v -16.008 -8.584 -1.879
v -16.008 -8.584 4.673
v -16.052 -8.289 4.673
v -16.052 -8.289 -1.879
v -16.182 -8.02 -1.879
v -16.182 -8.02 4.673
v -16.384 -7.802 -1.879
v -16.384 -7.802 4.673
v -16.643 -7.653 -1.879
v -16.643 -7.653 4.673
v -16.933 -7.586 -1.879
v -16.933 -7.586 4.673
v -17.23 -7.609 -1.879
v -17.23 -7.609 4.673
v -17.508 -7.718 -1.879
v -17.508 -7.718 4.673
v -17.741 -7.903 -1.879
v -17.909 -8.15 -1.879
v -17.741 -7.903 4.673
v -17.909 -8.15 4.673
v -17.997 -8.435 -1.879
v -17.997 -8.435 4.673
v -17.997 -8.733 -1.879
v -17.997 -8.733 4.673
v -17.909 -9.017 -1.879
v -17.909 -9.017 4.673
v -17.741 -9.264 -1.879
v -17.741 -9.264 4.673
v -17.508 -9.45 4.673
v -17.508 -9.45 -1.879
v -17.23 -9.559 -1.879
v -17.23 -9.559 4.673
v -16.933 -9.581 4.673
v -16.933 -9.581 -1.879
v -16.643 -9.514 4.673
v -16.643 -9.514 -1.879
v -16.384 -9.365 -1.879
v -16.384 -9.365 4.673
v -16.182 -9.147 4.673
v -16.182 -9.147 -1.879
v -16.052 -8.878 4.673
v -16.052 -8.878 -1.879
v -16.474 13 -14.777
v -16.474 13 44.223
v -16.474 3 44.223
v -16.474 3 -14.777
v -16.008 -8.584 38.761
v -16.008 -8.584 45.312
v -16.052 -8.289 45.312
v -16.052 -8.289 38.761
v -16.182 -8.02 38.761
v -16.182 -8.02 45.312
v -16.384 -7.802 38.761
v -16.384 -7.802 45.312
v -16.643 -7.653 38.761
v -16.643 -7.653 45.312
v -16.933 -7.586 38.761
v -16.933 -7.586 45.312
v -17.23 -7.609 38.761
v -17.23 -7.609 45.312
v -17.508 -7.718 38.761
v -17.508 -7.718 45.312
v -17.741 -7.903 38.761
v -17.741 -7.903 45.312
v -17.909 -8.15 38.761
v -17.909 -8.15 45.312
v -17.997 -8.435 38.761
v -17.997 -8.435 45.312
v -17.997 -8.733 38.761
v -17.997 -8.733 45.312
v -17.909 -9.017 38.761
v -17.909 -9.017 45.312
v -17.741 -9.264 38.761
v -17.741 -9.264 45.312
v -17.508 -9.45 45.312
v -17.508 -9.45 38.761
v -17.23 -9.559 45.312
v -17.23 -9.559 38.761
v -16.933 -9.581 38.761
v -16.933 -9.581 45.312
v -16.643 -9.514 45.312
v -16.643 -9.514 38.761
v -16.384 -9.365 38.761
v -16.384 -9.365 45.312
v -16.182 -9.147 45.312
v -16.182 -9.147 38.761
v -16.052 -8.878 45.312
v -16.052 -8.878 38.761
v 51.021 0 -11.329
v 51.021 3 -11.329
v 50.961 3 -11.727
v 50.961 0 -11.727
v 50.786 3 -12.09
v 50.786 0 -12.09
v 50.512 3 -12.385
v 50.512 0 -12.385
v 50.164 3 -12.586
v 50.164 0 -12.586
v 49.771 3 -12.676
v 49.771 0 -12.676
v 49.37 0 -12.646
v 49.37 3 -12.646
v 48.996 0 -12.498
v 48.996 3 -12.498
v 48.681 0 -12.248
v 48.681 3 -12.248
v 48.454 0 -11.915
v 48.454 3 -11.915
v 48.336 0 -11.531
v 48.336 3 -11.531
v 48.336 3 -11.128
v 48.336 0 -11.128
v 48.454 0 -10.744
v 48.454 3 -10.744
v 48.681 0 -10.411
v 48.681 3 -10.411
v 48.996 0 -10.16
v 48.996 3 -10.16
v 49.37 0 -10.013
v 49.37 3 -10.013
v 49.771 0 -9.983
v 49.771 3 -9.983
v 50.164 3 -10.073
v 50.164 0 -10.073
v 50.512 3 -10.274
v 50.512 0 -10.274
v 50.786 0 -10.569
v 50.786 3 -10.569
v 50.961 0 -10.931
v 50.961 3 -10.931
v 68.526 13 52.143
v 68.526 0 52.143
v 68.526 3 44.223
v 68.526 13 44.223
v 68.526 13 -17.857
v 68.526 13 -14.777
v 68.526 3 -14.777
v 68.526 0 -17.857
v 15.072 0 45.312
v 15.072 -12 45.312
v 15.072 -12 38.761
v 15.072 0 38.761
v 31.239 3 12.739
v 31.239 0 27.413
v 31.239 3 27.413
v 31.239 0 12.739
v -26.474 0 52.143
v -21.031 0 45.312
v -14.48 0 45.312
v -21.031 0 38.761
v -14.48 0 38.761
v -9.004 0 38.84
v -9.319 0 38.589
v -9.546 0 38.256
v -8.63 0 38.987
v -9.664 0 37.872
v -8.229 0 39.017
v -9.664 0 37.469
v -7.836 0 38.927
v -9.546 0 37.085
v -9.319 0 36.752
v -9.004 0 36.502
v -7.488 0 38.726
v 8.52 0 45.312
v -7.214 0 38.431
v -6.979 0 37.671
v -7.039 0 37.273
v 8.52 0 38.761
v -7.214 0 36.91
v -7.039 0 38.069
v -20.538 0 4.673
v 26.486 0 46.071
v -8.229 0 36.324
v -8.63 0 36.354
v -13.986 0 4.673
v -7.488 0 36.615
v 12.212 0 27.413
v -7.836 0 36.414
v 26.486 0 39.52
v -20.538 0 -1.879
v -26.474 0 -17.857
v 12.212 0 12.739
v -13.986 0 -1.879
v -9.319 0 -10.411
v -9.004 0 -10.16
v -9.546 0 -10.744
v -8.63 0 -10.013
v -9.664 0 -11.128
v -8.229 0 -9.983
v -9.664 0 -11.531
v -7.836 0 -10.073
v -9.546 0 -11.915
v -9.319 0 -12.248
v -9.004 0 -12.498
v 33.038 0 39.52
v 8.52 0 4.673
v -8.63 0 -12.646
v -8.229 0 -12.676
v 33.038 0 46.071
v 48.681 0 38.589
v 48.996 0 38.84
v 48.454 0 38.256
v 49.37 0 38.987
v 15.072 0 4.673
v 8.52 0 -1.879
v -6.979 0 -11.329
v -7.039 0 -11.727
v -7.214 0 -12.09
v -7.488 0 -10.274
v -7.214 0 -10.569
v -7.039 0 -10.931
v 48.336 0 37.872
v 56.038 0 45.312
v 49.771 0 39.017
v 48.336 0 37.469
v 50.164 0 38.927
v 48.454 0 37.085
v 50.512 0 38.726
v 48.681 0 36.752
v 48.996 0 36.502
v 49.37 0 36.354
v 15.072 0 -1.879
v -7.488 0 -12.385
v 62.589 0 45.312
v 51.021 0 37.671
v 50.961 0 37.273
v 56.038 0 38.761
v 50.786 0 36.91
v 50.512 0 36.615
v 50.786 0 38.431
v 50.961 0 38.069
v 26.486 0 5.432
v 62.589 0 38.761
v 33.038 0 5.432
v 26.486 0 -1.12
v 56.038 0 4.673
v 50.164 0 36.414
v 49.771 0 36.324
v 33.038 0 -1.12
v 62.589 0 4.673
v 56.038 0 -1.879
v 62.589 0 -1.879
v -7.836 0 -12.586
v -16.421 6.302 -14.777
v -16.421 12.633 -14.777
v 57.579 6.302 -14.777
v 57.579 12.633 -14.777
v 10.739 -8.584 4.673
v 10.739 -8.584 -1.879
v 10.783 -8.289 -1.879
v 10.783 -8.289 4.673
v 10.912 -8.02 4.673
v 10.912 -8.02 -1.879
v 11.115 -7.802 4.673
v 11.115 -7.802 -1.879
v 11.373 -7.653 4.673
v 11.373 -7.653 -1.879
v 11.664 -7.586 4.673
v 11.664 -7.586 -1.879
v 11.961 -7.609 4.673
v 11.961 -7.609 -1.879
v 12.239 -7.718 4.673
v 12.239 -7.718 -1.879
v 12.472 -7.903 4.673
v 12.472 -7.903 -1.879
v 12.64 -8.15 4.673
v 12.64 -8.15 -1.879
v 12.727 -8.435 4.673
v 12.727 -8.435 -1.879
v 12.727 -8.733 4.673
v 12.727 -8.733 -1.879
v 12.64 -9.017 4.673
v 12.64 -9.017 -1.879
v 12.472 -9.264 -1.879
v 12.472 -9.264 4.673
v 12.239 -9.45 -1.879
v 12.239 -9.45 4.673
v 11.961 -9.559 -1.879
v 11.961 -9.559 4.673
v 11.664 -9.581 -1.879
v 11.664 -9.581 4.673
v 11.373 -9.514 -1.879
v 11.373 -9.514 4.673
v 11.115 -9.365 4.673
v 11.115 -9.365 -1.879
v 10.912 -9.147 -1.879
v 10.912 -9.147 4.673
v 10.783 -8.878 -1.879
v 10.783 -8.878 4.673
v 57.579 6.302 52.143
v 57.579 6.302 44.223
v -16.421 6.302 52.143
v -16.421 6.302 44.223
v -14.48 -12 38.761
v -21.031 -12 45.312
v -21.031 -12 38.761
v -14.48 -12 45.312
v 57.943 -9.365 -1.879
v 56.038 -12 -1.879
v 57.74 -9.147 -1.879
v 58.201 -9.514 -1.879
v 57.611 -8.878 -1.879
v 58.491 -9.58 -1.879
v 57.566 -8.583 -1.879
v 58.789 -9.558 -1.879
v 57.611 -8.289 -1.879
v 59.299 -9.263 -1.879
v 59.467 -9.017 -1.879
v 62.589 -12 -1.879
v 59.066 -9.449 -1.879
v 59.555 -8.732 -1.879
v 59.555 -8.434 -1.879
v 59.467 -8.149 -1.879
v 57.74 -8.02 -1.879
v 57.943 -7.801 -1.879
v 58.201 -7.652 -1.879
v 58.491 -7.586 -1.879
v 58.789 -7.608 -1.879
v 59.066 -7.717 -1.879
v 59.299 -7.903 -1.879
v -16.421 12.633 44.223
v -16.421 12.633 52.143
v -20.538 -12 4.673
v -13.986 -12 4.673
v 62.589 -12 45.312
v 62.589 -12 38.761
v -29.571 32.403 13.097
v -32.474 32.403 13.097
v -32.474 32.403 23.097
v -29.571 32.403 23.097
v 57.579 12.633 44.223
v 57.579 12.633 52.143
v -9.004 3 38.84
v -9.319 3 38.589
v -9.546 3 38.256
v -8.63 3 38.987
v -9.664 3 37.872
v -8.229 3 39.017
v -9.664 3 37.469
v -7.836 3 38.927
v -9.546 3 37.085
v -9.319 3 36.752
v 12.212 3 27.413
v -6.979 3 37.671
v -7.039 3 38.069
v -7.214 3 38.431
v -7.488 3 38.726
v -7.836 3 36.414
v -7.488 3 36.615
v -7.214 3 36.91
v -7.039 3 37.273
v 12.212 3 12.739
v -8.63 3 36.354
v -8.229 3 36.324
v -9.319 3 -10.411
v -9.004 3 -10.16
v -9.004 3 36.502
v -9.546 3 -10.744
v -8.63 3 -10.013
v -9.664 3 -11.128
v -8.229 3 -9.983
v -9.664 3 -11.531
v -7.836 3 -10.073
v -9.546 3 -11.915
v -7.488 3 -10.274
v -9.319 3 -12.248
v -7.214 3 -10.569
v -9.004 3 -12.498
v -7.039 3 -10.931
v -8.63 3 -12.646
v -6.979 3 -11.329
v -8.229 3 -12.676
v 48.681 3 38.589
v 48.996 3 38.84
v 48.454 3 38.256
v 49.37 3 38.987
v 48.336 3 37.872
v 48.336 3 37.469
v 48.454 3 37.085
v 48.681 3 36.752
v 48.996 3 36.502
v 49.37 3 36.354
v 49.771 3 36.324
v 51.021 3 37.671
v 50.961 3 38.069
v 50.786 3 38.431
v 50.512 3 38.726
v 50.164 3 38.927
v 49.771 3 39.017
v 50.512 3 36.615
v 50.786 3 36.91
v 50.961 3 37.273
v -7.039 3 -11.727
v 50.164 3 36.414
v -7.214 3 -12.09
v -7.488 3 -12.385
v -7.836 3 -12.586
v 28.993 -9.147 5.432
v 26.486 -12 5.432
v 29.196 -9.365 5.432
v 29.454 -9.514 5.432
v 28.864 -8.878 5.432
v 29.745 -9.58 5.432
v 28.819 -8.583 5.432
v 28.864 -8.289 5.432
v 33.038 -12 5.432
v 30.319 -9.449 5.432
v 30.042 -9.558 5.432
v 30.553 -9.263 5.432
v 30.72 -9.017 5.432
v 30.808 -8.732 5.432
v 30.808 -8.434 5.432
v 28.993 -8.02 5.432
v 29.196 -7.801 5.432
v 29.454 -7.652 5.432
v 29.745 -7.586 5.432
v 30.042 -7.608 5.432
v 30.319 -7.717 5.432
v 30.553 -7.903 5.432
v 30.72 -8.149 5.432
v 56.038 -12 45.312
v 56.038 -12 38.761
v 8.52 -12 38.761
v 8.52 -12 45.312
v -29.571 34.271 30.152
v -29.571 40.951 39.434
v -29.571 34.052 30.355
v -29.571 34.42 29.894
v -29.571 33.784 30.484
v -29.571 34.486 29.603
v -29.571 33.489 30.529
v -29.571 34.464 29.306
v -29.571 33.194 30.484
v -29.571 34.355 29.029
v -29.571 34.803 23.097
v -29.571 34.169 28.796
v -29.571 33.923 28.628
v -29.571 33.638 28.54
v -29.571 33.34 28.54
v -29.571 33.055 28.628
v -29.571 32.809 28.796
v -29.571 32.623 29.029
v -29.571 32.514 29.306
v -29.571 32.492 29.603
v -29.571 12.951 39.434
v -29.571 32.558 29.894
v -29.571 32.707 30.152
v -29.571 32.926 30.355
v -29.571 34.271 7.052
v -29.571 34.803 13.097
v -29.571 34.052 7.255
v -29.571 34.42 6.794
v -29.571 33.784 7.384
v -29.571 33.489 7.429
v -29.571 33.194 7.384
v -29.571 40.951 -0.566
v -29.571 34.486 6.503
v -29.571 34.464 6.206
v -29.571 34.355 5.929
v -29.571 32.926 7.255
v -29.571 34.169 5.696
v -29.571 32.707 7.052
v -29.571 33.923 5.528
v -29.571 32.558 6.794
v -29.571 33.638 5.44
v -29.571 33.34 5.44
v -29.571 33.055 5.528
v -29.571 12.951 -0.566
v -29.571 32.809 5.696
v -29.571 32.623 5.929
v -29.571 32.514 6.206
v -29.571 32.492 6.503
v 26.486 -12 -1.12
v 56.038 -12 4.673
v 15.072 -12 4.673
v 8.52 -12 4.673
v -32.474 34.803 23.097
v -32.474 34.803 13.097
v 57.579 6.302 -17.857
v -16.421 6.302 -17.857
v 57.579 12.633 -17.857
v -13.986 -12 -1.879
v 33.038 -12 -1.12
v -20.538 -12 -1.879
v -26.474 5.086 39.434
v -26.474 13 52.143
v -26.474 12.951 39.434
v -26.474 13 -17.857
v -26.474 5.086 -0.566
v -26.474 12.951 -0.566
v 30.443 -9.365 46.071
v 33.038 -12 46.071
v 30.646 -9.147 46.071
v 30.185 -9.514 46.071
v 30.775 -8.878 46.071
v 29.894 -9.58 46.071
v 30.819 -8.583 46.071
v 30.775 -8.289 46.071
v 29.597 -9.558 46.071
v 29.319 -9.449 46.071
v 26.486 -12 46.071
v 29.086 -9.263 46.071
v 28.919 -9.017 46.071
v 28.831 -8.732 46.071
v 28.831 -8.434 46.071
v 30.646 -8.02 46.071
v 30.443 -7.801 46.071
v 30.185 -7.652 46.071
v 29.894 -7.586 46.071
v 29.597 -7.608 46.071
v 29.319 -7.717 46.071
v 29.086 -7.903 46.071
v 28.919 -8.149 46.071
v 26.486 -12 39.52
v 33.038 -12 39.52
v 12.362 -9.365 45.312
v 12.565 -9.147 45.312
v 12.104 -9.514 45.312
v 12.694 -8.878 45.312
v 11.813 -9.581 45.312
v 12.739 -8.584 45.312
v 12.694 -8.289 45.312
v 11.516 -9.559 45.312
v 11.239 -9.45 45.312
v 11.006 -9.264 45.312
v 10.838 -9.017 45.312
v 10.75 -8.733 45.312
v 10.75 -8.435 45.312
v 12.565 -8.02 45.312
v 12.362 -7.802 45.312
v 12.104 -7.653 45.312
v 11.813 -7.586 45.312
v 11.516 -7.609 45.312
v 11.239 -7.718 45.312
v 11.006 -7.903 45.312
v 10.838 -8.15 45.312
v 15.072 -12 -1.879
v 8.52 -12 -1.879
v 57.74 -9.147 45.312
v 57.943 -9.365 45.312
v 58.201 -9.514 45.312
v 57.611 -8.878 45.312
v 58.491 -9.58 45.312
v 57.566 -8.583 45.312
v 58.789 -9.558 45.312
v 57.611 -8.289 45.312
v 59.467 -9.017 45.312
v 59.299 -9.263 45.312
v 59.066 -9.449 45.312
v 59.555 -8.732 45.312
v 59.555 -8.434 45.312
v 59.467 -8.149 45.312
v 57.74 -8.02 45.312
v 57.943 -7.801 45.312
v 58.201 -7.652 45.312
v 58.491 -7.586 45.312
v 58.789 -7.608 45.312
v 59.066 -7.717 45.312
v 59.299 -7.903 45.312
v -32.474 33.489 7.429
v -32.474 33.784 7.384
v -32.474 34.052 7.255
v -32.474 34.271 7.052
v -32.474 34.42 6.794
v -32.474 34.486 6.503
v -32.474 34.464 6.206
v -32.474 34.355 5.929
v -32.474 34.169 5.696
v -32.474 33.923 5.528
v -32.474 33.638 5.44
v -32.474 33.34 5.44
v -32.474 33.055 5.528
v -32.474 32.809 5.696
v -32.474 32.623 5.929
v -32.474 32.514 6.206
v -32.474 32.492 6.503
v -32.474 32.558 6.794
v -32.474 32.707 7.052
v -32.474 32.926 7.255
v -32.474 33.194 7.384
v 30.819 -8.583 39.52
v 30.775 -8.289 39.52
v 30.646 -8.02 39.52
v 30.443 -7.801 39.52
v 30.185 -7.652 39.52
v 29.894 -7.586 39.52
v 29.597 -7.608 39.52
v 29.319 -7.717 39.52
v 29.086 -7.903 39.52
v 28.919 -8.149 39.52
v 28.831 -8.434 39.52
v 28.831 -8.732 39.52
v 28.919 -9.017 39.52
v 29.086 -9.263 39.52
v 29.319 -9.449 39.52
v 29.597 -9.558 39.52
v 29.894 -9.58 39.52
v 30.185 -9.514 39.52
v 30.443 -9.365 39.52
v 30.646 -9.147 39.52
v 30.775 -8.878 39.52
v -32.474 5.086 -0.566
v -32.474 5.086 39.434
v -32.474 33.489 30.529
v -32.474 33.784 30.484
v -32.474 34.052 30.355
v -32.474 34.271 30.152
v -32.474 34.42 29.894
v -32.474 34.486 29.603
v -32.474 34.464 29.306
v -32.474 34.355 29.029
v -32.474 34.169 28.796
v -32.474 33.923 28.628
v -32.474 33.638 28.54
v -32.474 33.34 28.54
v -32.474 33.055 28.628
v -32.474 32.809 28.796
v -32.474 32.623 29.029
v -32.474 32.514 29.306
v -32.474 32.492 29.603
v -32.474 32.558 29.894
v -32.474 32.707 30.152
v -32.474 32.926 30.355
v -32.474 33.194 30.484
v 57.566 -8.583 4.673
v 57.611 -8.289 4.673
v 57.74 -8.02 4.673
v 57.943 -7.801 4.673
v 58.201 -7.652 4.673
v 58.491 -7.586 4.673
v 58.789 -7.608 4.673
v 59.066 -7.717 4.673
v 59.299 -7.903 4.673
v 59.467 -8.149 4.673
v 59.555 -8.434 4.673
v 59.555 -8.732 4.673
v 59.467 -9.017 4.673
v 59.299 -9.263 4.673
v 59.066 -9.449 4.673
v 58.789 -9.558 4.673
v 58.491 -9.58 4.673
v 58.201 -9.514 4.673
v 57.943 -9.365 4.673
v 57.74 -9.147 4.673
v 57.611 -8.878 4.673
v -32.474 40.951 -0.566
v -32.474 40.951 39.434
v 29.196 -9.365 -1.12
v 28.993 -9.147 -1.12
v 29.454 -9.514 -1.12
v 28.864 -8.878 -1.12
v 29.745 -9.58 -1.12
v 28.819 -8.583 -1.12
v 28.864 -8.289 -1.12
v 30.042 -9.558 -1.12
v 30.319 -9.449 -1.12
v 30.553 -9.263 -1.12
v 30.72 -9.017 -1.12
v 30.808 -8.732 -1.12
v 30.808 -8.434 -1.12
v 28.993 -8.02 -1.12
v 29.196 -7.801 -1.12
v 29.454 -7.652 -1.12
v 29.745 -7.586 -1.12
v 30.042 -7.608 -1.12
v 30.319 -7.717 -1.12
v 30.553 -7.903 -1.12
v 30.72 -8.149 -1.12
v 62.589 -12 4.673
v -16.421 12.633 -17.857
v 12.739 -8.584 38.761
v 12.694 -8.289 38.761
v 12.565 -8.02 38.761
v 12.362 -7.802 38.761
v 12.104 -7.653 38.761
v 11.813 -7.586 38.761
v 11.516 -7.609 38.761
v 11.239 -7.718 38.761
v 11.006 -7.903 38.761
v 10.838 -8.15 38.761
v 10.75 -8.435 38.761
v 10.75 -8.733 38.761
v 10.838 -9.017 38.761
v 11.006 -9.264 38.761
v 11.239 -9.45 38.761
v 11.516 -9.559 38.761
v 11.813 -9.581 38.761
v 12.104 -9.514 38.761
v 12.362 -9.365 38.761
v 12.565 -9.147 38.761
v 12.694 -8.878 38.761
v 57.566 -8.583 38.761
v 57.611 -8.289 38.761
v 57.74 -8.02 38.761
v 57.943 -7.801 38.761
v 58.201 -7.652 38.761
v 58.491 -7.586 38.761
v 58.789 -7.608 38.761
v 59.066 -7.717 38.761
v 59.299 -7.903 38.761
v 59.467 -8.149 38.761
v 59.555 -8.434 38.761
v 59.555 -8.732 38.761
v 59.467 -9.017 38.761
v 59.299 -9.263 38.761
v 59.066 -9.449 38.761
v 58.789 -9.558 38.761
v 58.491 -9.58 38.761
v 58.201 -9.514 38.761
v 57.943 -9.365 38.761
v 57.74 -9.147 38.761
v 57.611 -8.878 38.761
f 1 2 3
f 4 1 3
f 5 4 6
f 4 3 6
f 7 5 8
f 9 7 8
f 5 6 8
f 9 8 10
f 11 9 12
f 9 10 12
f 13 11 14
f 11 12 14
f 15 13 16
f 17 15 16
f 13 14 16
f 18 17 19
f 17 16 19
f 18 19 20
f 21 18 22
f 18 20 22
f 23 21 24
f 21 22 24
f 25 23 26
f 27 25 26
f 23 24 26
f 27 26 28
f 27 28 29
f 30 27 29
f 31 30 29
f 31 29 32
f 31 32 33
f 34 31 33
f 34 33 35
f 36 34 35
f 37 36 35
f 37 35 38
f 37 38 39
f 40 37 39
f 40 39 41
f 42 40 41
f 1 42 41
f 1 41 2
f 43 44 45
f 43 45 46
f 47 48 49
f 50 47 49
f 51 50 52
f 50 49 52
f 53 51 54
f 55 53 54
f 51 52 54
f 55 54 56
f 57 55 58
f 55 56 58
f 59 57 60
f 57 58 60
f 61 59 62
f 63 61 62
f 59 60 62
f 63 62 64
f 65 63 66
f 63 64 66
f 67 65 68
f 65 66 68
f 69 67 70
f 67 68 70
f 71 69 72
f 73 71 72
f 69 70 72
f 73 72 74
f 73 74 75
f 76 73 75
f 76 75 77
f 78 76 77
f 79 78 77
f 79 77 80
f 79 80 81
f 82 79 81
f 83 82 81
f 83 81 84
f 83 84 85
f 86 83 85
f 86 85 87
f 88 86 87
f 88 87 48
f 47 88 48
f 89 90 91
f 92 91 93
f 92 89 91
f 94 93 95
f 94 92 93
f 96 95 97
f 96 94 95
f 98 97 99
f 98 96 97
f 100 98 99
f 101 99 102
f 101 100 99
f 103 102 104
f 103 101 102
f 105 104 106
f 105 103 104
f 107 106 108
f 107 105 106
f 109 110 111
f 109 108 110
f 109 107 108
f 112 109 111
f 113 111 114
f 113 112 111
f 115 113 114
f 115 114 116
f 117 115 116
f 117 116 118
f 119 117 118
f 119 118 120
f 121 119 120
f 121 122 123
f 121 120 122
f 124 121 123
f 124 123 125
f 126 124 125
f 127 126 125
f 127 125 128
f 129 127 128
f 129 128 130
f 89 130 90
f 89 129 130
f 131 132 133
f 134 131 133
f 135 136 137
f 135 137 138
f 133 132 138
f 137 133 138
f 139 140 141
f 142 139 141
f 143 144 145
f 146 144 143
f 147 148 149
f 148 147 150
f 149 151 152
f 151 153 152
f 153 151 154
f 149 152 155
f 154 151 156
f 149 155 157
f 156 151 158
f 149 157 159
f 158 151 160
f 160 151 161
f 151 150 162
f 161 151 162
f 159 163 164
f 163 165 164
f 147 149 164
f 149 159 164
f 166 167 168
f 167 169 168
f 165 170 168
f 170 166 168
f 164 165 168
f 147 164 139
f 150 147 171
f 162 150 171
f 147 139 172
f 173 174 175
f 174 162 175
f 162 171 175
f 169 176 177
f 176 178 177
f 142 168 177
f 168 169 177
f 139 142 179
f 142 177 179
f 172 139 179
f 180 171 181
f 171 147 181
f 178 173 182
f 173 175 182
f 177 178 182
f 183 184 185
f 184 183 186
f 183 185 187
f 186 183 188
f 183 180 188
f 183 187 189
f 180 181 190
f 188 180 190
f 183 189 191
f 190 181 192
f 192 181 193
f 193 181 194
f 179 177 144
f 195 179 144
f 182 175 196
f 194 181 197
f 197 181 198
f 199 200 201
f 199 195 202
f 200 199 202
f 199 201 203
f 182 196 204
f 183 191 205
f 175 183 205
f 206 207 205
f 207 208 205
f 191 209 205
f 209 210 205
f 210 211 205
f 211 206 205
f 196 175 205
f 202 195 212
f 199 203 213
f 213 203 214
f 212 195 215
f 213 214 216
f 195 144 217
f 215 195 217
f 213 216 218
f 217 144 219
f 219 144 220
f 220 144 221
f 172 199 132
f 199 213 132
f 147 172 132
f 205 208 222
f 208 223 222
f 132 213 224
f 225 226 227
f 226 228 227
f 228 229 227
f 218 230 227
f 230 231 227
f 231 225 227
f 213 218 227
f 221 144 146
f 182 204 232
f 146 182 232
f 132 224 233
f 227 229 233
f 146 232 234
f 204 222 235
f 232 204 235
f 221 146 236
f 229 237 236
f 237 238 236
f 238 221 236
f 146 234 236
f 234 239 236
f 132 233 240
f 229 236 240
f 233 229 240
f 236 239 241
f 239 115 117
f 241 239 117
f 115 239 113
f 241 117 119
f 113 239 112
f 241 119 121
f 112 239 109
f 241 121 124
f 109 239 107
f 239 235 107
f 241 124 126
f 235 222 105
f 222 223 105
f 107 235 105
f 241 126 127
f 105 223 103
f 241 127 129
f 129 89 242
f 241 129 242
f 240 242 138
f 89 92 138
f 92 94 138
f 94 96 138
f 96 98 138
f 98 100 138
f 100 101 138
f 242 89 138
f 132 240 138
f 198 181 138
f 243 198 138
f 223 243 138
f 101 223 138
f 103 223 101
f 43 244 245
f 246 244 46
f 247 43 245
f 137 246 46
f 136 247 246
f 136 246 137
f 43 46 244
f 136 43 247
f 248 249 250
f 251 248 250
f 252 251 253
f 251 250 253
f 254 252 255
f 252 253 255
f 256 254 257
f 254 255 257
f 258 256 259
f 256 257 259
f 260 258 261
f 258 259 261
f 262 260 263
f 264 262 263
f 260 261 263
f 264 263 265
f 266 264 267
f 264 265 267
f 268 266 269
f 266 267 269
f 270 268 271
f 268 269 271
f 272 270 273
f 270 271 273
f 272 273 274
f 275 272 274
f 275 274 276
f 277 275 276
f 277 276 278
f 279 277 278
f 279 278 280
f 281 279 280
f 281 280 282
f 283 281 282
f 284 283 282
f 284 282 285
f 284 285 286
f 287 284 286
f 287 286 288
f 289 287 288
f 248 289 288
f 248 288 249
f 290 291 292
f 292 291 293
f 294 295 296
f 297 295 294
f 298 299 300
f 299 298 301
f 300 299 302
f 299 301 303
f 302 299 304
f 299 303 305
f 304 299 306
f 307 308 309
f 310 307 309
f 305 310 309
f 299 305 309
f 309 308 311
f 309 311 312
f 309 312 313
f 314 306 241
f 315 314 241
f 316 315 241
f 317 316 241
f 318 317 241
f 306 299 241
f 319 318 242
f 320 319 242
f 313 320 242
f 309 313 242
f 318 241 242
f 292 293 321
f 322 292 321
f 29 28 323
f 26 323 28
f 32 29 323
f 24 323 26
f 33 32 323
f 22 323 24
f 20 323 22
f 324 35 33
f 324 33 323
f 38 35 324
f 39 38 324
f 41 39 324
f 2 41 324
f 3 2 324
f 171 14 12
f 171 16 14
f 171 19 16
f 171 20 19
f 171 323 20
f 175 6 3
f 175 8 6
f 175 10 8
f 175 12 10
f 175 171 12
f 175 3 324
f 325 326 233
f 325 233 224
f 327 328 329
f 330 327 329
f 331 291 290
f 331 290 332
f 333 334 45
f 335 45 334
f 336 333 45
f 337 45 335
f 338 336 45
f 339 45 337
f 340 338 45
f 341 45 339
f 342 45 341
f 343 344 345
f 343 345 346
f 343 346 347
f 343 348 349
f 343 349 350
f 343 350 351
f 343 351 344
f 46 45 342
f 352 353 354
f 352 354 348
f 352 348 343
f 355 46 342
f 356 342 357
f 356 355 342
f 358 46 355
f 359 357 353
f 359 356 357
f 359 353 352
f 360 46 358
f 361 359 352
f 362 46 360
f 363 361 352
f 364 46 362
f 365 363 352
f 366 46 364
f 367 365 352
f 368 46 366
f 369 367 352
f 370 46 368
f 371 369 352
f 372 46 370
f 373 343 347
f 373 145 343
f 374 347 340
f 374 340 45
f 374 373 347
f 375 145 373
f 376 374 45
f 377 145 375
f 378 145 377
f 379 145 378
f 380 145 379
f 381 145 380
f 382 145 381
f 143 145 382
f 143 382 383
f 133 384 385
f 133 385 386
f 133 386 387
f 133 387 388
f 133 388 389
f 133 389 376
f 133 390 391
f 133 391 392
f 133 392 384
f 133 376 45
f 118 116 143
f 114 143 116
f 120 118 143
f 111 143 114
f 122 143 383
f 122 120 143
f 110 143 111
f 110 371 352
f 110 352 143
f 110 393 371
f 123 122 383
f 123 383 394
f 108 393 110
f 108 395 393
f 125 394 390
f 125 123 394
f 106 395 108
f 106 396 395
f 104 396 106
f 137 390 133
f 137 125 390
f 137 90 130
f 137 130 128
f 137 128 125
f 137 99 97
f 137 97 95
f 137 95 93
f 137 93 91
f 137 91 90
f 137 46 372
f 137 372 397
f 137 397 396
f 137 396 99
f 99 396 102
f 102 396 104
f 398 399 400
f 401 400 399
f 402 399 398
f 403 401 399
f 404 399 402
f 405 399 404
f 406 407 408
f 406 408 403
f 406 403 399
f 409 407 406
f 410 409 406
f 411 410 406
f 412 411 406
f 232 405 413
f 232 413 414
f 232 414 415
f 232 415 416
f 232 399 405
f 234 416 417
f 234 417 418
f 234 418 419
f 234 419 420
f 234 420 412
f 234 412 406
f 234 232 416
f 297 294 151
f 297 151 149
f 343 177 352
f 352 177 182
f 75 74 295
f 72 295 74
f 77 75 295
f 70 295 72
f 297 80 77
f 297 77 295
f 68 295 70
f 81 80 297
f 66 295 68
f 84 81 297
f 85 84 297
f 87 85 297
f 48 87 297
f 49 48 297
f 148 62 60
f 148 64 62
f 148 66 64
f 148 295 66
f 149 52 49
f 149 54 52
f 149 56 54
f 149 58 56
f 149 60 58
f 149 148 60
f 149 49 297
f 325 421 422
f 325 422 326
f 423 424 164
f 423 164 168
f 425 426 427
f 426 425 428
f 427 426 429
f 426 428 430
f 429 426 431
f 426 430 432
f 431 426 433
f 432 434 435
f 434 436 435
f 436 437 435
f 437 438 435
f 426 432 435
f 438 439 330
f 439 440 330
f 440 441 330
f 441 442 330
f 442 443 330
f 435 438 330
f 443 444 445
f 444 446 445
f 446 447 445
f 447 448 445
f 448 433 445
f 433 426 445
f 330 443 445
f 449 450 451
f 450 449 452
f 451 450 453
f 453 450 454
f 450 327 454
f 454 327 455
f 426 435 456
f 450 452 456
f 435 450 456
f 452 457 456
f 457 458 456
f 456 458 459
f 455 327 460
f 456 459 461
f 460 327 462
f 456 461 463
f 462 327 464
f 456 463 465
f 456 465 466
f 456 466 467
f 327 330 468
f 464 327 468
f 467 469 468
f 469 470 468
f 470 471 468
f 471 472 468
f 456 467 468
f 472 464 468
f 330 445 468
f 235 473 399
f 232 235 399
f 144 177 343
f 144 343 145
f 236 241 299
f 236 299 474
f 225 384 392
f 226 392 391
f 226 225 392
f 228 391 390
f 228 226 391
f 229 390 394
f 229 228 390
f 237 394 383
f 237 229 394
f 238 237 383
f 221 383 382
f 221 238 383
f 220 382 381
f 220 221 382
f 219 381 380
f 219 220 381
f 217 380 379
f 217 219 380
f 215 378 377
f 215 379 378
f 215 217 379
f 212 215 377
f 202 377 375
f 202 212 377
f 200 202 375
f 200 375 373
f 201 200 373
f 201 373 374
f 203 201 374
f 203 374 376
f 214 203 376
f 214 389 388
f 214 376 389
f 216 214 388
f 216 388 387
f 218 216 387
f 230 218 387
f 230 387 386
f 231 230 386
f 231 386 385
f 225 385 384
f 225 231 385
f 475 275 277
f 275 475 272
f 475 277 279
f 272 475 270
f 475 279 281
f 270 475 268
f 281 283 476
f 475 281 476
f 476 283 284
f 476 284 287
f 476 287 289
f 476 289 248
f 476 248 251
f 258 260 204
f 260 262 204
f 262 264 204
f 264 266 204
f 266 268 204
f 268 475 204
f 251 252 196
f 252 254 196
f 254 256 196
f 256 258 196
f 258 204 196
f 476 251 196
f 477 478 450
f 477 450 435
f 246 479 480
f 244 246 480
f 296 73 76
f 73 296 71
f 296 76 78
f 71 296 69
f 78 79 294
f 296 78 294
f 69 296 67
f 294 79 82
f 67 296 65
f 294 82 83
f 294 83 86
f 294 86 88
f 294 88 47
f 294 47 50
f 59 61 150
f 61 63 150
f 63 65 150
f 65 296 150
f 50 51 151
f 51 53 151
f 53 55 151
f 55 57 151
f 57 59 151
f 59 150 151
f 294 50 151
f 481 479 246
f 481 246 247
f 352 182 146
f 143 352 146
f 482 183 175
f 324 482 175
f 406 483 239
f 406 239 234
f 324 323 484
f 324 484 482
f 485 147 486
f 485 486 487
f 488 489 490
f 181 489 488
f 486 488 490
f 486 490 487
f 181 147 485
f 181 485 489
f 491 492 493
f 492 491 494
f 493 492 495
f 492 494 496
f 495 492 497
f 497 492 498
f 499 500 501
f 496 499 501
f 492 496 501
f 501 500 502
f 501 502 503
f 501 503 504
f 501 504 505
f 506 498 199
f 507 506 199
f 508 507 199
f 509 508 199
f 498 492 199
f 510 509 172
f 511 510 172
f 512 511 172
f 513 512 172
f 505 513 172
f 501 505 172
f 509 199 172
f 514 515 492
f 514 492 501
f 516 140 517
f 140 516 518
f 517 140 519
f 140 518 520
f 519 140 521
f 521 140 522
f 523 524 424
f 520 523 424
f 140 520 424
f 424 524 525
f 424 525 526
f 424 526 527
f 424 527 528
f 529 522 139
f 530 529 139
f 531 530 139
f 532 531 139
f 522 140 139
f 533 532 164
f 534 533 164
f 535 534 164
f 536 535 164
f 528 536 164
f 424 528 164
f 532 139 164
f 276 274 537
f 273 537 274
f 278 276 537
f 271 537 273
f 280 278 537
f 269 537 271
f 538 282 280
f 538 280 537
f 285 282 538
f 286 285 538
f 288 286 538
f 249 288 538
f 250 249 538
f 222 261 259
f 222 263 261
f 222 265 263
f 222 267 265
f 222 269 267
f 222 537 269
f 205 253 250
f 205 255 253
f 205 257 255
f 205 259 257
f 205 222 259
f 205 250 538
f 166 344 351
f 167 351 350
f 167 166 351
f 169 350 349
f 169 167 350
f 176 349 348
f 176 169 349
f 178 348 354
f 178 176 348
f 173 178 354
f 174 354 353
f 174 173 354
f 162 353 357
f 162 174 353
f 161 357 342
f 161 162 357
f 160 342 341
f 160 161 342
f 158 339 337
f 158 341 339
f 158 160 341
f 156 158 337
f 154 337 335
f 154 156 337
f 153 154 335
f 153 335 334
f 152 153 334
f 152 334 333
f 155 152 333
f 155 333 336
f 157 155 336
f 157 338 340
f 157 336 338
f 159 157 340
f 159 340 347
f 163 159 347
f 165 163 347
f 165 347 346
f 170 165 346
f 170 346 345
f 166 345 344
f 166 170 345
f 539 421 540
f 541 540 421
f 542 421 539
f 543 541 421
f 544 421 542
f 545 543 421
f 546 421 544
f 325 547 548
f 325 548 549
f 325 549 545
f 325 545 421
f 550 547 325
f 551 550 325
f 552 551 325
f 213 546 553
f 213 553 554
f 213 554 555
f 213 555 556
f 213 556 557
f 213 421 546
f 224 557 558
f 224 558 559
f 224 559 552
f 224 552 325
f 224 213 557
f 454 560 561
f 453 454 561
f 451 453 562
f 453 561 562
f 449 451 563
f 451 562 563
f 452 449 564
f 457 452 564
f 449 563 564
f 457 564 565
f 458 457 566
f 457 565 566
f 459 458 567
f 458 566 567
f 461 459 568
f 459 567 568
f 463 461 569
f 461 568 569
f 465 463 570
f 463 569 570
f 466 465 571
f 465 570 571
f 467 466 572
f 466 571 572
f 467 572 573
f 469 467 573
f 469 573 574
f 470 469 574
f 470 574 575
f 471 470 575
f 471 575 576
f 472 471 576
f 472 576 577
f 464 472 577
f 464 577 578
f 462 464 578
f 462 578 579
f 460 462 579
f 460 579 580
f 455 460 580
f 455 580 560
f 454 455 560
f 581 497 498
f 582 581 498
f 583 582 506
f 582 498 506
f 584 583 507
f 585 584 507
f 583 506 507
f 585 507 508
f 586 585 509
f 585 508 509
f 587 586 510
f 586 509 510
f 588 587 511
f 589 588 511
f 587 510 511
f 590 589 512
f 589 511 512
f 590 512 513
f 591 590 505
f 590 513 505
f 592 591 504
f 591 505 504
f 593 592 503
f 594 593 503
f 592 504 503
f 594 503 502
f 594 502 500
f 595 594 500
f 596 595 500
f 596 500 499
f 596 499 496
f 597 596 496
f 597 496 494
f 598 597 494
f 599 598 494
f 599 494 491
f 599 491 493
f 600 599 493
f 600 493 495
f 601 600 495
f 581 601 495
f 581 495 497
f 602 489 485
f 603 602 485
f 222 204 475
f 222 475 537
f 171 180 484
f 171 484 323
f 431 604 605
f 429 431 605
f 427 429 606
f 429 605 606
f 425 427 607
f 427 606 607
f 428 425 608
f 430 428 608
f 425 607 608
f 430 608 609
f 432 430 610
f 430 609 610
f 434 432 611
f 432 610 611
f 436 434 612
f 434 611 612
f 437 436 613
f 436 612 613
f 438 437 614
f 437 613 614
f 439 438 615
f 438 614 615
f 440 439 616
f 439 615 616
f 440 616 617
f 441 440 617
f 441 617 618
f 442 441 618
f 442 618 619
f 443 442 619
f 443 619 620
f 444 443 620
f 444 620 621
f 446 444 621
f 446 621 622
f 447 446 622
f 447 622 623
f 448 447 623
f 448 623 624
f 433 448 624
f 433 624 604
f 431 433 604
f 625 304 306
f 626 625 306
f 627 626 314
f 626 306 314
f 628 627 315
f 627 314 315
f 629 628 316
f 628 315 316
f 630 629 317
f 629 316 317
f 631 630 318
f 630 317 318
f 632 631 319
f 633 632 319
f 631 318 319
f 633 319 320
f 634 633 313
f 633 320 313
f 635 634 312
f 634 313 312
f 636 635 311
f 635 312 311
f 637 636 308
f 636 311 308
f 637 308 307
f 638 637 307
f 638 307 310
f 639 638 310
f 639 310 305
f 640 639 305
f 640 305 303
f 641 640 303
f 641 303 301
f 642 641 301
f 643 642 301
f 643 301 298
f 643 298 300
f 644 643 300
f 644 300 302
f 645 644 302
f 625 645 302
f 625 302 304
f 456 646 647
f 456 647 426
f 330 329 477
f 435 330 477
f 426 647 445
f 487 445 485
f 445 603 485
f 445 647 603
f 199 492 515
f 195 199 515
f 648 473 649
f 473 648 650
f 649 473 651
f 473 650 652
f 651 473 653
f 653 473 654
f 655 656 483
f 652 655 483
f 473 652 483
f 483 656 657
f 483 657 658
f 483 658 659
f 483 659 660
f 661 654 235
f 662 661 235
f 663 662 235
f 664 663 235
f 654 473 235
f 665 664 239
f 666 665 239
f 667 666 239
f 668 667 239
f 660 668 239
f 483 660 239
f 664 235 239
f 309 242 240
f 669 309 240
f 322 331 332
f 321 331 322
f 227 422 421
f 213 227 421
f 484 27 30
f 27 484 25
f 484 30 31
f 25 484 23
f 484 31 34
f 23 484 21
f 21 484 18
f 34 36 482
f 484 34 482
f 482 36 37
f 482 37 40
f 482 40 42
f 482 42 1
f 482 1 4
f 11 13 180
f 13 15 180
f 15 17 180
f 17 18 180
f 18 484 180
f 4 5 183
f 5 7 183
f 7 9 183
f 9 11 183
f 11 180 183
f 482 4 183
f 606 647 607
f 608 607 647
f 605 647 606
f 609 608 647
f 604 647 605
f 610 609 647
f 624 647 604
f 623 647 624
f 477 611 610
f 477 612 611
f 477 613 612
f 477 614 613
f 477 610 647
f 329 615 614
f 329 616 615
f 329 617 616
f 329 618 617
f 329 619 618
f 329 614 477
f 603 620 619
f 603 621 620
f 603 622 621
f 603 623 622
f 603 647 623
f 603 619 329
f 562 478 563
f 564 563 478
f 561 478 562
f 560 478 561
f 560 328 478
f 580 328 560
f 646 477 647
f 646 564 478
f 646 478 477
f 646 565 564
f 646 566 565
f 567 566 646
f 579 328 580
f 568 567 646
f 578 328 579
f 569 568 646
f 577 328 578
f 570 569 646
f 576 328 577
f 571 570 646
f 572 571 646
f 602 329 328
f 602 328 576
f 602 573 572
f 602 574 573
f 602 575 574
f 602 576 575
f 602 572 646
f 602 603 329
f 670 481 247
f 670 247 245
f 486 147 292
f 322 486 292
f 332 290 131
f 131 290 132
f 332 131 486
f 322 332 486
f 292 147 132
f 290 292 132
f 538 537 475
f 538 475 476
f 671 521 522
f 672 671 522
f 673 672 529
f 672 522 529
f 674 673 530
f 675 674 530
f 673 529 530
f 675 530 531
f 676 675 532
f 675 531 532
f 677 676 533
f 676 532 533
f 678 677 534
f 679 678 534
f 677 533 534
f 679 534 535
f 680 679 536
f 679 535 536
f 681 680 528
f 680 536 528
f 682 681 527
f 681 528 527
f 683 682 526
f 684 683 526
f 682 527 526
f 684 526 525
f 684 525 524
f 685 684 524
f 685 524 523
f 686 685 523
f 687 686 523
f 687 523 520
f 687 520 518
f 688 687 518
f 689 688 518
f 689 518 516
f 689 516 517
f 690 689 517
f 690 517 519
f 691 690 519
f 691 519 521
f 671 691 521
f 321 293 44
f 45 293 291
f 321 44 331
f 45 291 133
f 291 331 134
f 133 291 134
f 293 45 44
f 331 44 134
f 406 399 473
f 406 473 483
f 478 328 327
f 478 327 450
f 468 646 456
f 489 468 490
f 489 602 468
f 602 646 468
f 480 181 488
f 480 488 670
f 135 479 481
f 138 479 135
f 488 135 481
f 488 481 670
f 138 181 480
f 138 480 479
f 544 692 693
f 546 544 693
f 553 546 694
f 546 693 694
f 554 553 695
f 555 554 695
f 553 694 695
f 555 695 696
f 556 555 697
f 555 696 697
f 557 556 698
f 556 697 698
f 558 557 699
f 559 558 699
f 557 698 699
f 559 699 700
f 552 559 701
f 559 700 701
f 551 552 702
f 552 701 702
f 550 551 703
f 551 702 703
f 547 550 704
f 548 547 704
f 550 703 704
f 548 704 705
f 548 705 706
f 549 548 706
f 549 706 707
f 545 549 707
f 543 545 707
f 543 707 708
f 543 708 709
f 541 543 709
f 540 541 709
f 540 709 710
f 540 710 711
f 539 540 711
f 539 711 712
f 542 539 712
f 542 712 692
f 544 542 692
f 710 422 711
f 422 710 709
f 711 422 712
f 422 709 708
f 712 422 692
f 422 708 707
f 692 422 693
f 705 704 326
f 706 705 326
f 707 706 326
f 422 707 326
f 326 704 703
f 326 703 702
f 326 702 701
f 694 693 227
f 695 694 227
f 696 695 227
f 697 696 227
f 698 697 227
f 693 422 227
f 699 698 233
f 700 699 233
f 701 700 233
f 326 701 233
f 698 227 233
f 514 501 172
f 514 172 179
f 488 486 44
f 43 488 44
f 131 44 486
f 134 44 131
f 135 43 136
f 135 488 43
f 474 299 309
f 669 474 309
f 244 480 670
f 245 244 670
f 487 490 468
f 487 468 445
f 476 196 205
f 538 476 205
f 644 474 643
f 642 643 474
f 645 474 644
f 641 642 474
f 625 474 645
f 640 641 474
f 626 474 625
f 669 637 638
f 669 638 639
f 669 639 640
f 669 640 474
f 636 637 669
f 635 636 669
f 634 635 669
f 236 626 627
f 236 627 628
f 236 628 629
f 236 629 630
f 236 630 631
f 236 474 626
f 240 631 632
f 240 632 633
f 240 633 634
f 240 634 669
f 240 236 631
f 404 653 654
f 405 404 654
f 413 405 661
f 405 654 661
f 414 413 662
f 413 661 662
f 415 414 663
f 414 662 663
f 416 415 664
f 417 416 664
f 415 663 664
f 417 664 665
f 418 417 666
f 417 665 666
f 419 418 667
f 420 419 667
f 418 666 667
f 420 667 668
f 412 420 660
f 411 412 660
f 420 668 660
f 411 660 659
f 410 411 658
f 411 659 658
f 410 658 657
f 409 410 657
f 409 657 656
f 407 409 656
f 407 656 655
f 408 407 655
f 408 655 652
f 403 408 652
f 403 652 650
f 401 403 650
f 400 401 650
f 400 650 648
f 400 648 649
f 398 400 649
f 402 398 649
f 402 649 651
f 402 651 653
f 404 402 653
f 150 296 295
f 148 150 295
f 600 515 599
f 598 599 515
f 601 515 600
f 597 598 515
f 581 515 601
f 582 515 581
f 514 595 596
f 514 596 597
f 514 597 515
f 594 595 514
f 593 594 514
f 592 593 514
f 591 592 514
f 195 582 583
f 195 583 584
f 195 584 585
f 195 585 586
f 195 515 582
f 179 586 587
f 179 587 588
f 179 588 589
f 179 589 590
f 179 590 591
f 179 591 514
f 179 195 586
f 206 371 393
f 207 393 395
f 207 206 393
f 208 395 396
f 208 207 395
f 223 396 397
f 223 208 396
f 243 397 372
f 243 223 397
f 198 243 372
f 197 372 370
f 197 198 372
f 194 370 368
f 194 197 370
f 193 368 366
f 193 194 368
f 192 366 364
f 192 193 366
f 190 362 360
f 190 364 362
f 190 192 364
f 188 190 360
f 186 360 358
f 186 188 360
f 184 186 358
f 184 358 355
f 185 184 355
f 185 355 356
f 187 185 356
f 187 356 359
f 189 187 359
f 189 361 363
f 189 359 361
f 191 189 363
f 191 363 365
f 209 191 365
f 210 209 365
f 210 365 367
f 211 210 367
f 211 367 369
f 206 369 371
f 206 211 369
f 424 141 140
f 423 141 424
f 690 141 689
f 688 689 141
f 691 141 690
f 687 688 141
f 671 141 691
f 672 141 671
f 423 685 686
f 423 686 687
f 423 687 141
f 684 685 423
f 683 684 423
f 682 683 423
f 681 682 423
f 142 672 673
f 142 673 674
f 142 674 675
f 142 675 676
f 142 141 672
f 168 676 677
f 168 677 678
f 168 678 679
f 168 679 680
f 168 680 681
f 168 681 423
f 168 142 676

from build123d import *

# Parameters (mm, degrees)
SKETCH_1_W           = 95
SKETCH_1_H           = 70
SKETCH_1_R           = 1.35
SKETCH_1_W_2         = 19.026786566
SKETCH_1_H_2         = 14.673074928
EXTRUDE_1_DEPTH      = 13
SKETCH_3_W           = 85
SKETCH_3_H           = 59
CUT_EXTRUDE_1_DEPTH  = 10
SKETCH_4_W           = 6.551363844
SKETCH_4_H           = 6.551363844
EXTRUDE_2_DEPTH      = 12
SKETCH_7_W           = 6.551363844
SKETCH_7_H           = 6.551363844
EXTRUDE_3_DEPTH      = 12
SKETCH_9_R           = 1
CUT_EXTRUDE_4_DEPTH  = 63
SKETCH_5_R           = 1
CUT_EXTRUDE_5_DEPTH  = 56
SKETCH_12_W          = 6.551363844
SKETCH_12_H          = 6.551363844
EXTRUDE_4_DEPTH      = 12
SKETCH_13_R          = 1
CUT_EXTRUDE_6_DEPTH  = 9
SKETCH_15_R          = 1
CUT_EXTRUDE_7_DEPTH  = 51
SKETCH_17_W          = 6.551363844
SKETCH_17_H          = 6.551363844
EXTRUDE_5_DEPTH      = 12
SKETCH_18_R          = 1
CUT_EXTRUDE_8_DEPTH  = 12
SKETCH_19_R          = 1
CUT_EXTRUDE_9_DEPTH  = 12
SKETCH_20_W          = 40
SKETCH_20_H          = 7.86503053
EXTRUDE_6_DEPTH      = 6
SKETCH_21_W          = 2.903775518
SKETCH_21_H          = 40
EXTRUDE_7_DEPTH      = 28
SKETCH_22_W          = 74
SKETCH_22_H          = 6.331212291
CUT_EXTRUDE_10_DEPTH = 78
SKETCH_23_W          = 10
SKETCH_23_H          = 2.4
CUT_EXTRUDE_13_DEPTH = 10
SKETCH_25_R          = 1
CUT_EXTRUDE_14_DEPTH = 10


with BuildPart() as part:
    # 草图1 → 凸台-拉伸1 (new body)
    with BuildSketch(Plane(origin=(0, 0, 0), x_dir=(1, 0, 0), z_dir=(0, 1, 0))):
        with Locations((21.0257099, -17.142747506)):
            Rectangle(SKETCH_1_W, SKETCH_1_H)
        with Locations((49.670533911, 11.329362359)):
            Circle(SKETCH_1_R, mode=Mode.SUBTRACT)
        with Locations((49.670533911, -37.670637641)):
            Circle(SKETCH_1_R, mode=Mode.SUBTRACT)
        with Locations((-8.329466089, -37.670637641)):
            Circle(SKETCH_1_R, mode=Mode.SUBTRACT)
        with Locations((-8.329466089, 11.329362359)):
            Circle(SKETCH_1_R, mode=Mode.SUBTRACT)
        with Locations((21.72534394, -20.076013692)):
            Rectangle(SKETCH_1_W_2, SKETCH_1_H_2, mode=Mode.SUBTRACT)
    extrude(amount=EXTRUDE_1_DEPTH)

    # 草图3 → 切除-拉伸1 (cut)
    with BuildSketch(Plane(origin=(0, 13, 0), x_dir=(1, 0, 0), z_dir=(0, 1, 0))):
        with Locations((26.0257099, -14.722914633)):
            Rectangle(SKETCH_3_W, SKETCH_3_H)
    extrude(amount=-CUT_EXTRUDE_1_DEPTH, mode=Mode.SUBTRACT)

    # 草图4 → 凸台-拉伸2 (add)
    with BuildSketch(Plane.XZ):
        with Locations((-17.262018052, 1.397045451)):
            Rectangle(SKETCH_4_W, SKETCH_4_H)
        with Locations((-17.755298179, 42.036450596)):
            Rectangle(SKETCH_4_W, SKETCH_4_H)
        with Locations((59.313437853, 1.397045451)):
            Rectangle(SKETCH_4_W, SKETCH_4_H)
        with Locations((59.313437853, 42.036450596)):
            Rectangle(SKETCH_4_W, SKETCH_4_H)
    extrude(amount=EXTRUDE_2_DEPTH)

    # 草图7 → 凸台-拉伸3 (add)
    with BuildSketch(Plane.XZ):
        with Locations((29.762074009, 2.155967477)):
            Rectangle(SKETCH_7_W, SKETCH_7_H)
    extrude(amount=EXTRUDE_3_DEPTH)

    # 草图9 → 切除-拉伸4 (cut)
    with BuildSketch(Plane(origin=(0, 0, -1.119714445), x_dir=(-1, 0, 0), z_dir=(0, 0, -1))):
        with Locations((-29.819487591, -8.583293227)):
            Circle(SKETCH_9_R)
    extrude(amount=-CUT_EXTRUDE_4_DEPTH, mode=Mode.SUBTRACT)

    # 草图5 → 切除-拉伸5 (cut)
    with BuildSketch(Plane(origin=(0, 0, -1.878636471), x_dir=(-1, 0, 0), z_dir=(0, 0, -1))):
        with Locations((-58.566110561, -8.583293227)):
            Circle(SKETCH_5_R)
    extrude(amount=-CUT_EXTRUDE_5_DEPTH, mode=Mode.SUBTRACT)

    # 草图12 → 凸台-拉伸4 (add)
    with BuildSketch(Plane(origin=(0, 0, 0), x_dir=(-1, 0, 0), z_dir=(0, -1, 0))):
        with Locations((-29.762074009, -42.795372621)):
            Rectangle(SKETCH_12_W, SKETCH_12_H)
    extrude(amount=EXTRUDE_4_DEPTH)

    # 草图13 → 切除-拉伸6 (cut)
    with BuildSketch(Plane.XY.offset(46.071054543)):
        with Locations((29.819487591, -8.583293227)):
            Circle(SKETCH_13_R)
    extrude(amount=-CUT_EXTRUDE_6_DEPTH, mode=Mode.SUBTRACT)

    # 草图15 → 切除-拉伸7 (cut)
    with BuildSketch(Plane.XY.offset(45.312132518)):
        with Locations((-17.007970887, -8.583602404)):
            Circle(SKETCH_15_R)
    extrude(amount=-CUT_EXTRUDE_7_DEPTH, mode=Mode.SUBTRACT)

    # 草图17 → 凸台-拉伸5 (add)
    with BuildSketch(Plane(origin=(0, 0, 0), x_dir=(-1, 0, 0), z_dir=(0, -1, 0))):
        with Locations((-11.796065665, -42.036450596)):
            Rectangle(SKETCH_17_W, SKETCH_17_H)
        with Locations((-11.796065665, -1.397045451)):
            Rectangle(SKETCH_17_W, SKETCH_17_H)
    extrude(amount=EXTRUDE_5_DEPTH)

    # 草图18 → 切除-拉伸8 (cut)
    with BuildSketch(Plane.XY.offset(45.312132518)):
        with Locations((11.738652082, -8.583602404)):
            Circle(SKETCH_18_R)
    extrude(amount=-CUT_EXTRUDE_8_DEPTH, mode=Mode.SUBTRACT)

    # 草图19 → 切除-拉伸9 (cut)
    with BuildSketch(Plane(origin=(0, 0, -1.878636471), x_dir=(-1, 0, 0), z_dir=(0, 0, -1))):
        with Locations((-11.738652082, -8.583602404)):
            Circle(SKETCH_19_R)
    extrude(amount=-CUT_EXTRUDE_9_DEPTH, mode=Mode.SUBTRACT)

    # 草图20 → 凸台-拉伸6 (add)
    with BuildSketch(Plane.ZY.offset(26.4742901)):
        with Locations((19.434170465, 9.018379662)):
            Rectangle(SKETCH_20_W, SKETCH_20_H)
    extrude(amount=EXTRUDE_6_DEPTH)

    # 草图21 → 凸台-拉伸7 (add)
    with BuildSketch(Plane(origin=(0, 12.950894927, 0), x_dir=(1, 0, 0), z_dir=(0, 1, 0))):
        with Locations((-31.022402341, -19.434170465)):
            Rectangle(SKETCH_21_W, SKETCH_21_H)
    extrude(amount=EXTRUDE_7_DEPTH)

    # 草图22 → 切除-拉伸10 (cut)
    with BuildSketch(Plane(origin=(0, 0, -17.857252494), x_dir=(-1, 0, 0), z_dir=(0, 0, -1))):
        with Locations((-20.578648713, 9.467151169)):
            Rectangle(SKETCH_22_W, SKETCH_22_H)
    extrude(amount=-CUT_EXTRUDE_10_DEPTH, mode=Mode.SUBTRACT)

    # 草图23 → 切除-拉伸13 (cut)
    with BuildSketch(Plane.ZY.offset(32.4742901)):
        with Locations((18.096879679, 33.602818556)):
            Rectangle(SKETCH_23_W, SKETCH_23_H)
    extrude(amount=-CUT_EXTRUDE_13_DEPTH, mode=Mode.SUBTRACT)

    # 草图25 → 切除-拉伸14 (cut)
    with BuildSketch(Plane.ZY.offset(32.4742901)):
        with Locations((6.428608959, 33.489118381)):
            Circle(SKETCH_25_R)
        with Locations((29.528608959, 33.489118381)):
            Circle(SKETCH_25_R)
    extrude(amount=-CUT_EXTRUDE_14_DEPTH, mode=Mode.SUBTRACT)


solid = part.part
